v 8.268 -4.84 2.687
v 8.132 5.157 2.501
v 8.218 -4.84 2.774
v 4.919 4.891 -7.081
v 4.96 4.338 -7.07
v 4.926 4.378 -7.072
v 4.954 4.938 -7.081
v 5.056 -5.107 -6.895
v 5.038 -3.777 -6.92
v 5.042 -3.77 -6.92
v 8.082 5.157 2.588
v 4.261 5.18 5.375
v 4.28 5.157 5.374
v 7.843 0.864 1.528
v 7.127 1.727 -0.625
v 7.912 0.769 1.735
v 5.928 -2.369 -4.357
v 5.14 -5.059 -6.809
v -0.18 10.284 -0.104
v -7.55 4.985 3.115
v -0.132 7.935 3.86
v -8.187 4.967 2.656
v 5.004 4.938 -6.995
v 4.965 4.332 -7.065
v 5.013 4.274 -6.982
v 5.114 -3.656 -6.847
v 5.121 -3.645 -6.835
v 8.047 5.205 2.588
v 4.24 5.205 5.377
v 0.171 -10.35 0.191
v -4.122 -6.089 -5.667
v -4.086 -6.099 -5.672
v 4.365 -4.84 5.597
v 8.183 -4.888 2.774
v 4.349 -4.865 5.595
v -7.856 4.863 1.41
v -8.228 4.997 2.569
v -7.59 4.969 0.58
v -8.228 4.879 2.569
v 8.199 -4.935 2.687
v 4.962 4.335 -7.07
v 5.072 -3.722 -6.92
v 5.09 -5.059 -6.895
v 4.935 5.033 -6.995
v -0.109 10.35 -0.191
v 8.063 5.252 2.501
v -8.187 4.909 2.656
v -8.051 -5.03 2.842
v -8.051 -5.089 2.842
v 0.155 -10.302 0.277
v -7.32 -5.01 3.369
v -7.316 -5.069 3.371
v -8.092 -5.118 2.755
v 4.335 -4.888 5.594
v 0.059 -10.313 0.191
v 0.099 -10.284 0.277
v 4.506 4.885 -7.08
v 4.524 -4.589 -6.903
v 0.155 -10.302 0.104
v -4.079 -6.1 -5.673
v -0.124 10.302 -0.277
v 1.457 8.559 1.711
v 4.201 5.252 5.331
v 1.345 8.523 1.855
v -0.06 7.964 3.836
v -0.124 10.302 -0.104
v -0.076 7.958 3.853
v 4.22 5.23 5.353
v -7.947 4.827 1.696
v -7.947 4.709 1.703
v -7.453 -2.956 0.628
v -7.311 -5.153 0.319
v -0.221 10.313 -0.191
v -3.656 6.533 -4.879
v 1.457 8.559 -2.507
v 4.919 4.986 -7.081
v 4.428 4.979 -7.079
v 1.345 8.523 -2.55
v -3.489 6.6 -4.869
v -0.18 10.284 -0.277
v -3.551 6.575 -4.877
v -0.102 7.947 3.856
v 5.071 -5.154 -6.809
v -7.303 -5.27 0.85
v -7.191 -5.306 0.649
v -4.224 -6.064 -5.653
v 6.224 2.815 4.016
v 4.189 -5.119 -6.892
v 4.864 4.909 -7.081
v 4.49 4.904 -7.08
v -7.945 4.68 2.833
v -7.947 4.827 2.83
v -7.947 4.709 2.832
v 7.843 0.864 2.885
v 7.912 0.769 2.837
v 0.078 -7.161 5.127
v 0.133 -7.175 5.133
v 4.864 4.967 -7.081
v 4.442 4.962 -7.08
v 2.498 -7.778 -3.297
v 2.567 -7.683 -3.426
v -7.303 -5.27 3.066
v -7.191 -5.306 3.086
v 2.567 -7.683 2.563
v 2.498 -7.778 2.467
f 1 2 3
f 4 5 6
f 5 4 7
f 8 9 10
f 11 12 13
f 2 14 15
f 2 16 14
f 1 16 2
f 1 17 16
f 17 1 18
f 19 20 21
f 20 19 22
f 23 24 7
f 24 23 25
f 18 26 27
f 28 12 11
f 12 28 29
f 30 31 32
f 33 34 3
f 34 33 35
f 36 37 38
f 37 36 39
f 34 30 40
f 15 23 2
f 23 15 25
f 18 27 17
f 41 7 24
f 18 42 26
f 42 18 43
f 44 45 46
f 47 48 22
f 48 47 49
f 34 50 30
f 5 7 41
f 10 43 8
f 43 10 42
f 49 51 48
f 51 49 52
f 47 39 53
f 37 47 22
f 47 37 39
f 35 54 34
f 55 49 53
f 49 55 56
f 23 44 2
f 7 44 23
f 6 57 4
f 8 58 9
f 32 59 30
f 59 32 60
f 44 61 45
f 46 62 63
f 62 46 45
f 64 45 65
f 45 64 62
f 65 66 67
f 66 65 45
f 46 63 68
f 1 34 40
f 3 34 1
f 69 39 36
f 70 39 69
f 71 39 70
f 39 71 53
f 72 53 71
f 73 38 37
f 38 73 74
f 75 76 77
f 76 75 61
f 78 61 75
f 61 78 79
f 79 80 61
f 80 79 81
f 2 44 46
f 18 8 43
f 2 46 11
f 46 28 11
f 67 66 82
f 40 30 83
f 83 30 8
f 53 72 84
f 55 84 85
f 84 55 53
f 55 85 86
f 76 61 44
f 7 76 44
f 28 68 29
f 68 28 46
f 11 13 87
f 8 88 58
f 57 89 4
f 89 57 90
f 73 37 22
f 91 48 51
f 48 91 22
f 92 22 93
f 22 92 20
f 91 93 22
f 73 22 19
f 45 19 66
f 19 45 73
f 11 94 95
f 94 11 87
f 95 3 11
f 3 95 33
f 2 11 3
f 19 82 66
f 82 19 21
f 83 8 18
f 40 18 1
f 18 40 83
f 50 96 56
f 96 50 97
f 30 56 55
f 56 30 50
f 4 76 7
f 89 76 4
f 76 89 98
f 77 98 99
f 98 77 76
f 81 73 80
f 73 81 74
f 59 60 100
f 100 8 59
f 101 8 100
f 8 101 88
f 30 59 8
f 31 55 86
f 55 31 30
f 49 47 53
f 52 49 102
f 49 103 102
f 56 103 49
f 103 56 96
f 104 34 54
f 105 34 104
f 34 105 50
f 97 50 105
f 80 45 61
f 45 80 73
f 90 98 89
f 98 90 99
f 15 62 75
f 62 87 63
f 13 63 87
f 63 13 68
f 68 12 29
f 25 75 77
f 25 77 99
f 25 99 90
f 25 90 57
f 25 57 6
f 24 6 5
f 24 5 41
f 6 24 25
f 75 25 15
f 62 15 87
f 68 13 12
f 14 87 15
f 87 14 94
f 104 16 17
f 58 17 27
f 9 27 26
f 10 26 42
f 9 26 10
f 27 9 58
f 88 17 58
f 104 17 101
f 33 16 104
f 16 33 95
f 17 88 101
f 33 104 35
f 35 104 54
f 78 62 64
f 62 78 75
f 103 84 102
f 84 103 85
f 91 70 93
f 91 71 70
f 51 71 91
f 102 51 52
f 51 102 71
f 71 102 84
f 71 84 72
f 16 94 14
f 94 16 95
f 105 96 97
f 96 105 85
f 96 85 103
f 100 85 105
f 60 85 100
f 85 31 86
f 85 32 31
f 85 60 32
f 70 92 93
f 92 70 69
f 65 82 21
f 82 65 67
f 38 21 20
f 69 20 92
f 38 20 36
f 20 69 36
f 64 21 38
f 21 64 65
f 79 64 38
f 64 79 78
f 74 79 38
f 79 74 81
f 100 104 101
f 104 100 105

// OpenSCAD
// Auto-generated OpenSCAD file

    inner_points = 10*[[0.2467382987372412, -0.7682886734949378, -0.49999999999986955], [0.24673829873693467, -0.7682886734948948, 0.5000000000001305], [-0.786615939624791, 0.4767868289582747, -0.5000000000002401], [-0.7866159396250976, 0.47678682895831764, 0.4999999999997599], [0.7812222187521125, 0.07688996989682276, -0.499999999999742], [0.7812222187518058, 0.07688996989686578, 0.5000000000002579], [0.14257417702561617, 0.8463889489727611, -0.499999999999971], [0.14257417702530947, 0.8463889489728041, 0.500000000000029], [-0.7222389719987257, -0.5211388226006342, -0.5000000000001773], [-0.7222389719990324, -0.5211388226005911, 0.49999999999982264], [-0.06766404342154811, 0.022127650346434623, -1.0257311121191337], [-0.06766404342217727, 0.022127650346523024, 1.0257311121191337]];

    outer_points = 10*[[0.49039615507641166, 0.4938060709977507, -0.6994812171045163], [0.5040254575535104, -0.5059280714671878, -0.6808831929115636], [-0.8147039687334786, 0.4938060709977507, 0.25694319474479665], [-0.8010746662563799, -0.5059280714671878, 0.2755412189377493], [0.8031669173012401, 0.5157349758527835, 0.2500942530026042], [0.8167962197783389, -0.48399916661215503, 0.26869227719555683], [-0.0034293179349679237, 0.5157349758527835, 0.8411970471956072], [0.010199984542130835, -0.48399916661215503, 0.8597950713885598], [-0.5095030419019521, 0.48025326246127786, -0.6952483383208733], [-0.49587373942485335, -0.5194808800036607, -0.6766503141279206], [-0.01397999958724252, 1.02545841377403, -0.019076572038655804], [0.01397999958724252, -1.02545841377403, 0.019076572038655804]];

    // Convex hull for inner set (I)
    module inner_hull() {
        hull() {
            for (p = inner_points) {
                translate(p) sphere(r=0.1);
            }
        }
    }

    // Convex hull for outer set (O) minus inner hull (O \ I)
    module outer_minus_inner() {
        difference() {
            hull() {
                for (p = outer_points) {
                    translate(p) sphere(r=0.1);
                }
            }
            inner_hull(); // Subtract inner hull
        }
    }

    // Convex hull for outer set (O) minus all translated inner hulls
    module outer_minus_AllTranslationInner() {
        difference() {
            hull() {
                for (p = outer_points) {
                    translate(p) sphere(r=0.1);
                }
            }
            hull() {
                translate([0,0,50]) inner_hull();
                translate([0,0,-50]) inner_hull();
            }; // Subtract translated inner hulls
        }
    }

    // Difference between outer_minus_inner and outer_minus_AllTranslationInner
    module outer_minus_inner_diff() {
        difference() {
            // Outer minus inner
            difference() {
                hull() {
                    for (p = outer_points) {
                        translate(p) sphere(r=0.1);
                    }
                }
                inner_hull();
            }

            // Subtract Outer minus AllTranslationInner
            difference() {
                hull() {
                    for (p = outer_points) {
                        translate(p) sphere(r=0.1);
                    }
                }
                hull() {
                    translate([0,0,50]) inner_hull();
                    translate([0,0,-50]) inner_hull();
                };
            }
        }
    }

    // Rendering all with colors applied
    color([0, 1, 0, 1]) outer_minus_AllTranslationInner(); // Opaque green
    
